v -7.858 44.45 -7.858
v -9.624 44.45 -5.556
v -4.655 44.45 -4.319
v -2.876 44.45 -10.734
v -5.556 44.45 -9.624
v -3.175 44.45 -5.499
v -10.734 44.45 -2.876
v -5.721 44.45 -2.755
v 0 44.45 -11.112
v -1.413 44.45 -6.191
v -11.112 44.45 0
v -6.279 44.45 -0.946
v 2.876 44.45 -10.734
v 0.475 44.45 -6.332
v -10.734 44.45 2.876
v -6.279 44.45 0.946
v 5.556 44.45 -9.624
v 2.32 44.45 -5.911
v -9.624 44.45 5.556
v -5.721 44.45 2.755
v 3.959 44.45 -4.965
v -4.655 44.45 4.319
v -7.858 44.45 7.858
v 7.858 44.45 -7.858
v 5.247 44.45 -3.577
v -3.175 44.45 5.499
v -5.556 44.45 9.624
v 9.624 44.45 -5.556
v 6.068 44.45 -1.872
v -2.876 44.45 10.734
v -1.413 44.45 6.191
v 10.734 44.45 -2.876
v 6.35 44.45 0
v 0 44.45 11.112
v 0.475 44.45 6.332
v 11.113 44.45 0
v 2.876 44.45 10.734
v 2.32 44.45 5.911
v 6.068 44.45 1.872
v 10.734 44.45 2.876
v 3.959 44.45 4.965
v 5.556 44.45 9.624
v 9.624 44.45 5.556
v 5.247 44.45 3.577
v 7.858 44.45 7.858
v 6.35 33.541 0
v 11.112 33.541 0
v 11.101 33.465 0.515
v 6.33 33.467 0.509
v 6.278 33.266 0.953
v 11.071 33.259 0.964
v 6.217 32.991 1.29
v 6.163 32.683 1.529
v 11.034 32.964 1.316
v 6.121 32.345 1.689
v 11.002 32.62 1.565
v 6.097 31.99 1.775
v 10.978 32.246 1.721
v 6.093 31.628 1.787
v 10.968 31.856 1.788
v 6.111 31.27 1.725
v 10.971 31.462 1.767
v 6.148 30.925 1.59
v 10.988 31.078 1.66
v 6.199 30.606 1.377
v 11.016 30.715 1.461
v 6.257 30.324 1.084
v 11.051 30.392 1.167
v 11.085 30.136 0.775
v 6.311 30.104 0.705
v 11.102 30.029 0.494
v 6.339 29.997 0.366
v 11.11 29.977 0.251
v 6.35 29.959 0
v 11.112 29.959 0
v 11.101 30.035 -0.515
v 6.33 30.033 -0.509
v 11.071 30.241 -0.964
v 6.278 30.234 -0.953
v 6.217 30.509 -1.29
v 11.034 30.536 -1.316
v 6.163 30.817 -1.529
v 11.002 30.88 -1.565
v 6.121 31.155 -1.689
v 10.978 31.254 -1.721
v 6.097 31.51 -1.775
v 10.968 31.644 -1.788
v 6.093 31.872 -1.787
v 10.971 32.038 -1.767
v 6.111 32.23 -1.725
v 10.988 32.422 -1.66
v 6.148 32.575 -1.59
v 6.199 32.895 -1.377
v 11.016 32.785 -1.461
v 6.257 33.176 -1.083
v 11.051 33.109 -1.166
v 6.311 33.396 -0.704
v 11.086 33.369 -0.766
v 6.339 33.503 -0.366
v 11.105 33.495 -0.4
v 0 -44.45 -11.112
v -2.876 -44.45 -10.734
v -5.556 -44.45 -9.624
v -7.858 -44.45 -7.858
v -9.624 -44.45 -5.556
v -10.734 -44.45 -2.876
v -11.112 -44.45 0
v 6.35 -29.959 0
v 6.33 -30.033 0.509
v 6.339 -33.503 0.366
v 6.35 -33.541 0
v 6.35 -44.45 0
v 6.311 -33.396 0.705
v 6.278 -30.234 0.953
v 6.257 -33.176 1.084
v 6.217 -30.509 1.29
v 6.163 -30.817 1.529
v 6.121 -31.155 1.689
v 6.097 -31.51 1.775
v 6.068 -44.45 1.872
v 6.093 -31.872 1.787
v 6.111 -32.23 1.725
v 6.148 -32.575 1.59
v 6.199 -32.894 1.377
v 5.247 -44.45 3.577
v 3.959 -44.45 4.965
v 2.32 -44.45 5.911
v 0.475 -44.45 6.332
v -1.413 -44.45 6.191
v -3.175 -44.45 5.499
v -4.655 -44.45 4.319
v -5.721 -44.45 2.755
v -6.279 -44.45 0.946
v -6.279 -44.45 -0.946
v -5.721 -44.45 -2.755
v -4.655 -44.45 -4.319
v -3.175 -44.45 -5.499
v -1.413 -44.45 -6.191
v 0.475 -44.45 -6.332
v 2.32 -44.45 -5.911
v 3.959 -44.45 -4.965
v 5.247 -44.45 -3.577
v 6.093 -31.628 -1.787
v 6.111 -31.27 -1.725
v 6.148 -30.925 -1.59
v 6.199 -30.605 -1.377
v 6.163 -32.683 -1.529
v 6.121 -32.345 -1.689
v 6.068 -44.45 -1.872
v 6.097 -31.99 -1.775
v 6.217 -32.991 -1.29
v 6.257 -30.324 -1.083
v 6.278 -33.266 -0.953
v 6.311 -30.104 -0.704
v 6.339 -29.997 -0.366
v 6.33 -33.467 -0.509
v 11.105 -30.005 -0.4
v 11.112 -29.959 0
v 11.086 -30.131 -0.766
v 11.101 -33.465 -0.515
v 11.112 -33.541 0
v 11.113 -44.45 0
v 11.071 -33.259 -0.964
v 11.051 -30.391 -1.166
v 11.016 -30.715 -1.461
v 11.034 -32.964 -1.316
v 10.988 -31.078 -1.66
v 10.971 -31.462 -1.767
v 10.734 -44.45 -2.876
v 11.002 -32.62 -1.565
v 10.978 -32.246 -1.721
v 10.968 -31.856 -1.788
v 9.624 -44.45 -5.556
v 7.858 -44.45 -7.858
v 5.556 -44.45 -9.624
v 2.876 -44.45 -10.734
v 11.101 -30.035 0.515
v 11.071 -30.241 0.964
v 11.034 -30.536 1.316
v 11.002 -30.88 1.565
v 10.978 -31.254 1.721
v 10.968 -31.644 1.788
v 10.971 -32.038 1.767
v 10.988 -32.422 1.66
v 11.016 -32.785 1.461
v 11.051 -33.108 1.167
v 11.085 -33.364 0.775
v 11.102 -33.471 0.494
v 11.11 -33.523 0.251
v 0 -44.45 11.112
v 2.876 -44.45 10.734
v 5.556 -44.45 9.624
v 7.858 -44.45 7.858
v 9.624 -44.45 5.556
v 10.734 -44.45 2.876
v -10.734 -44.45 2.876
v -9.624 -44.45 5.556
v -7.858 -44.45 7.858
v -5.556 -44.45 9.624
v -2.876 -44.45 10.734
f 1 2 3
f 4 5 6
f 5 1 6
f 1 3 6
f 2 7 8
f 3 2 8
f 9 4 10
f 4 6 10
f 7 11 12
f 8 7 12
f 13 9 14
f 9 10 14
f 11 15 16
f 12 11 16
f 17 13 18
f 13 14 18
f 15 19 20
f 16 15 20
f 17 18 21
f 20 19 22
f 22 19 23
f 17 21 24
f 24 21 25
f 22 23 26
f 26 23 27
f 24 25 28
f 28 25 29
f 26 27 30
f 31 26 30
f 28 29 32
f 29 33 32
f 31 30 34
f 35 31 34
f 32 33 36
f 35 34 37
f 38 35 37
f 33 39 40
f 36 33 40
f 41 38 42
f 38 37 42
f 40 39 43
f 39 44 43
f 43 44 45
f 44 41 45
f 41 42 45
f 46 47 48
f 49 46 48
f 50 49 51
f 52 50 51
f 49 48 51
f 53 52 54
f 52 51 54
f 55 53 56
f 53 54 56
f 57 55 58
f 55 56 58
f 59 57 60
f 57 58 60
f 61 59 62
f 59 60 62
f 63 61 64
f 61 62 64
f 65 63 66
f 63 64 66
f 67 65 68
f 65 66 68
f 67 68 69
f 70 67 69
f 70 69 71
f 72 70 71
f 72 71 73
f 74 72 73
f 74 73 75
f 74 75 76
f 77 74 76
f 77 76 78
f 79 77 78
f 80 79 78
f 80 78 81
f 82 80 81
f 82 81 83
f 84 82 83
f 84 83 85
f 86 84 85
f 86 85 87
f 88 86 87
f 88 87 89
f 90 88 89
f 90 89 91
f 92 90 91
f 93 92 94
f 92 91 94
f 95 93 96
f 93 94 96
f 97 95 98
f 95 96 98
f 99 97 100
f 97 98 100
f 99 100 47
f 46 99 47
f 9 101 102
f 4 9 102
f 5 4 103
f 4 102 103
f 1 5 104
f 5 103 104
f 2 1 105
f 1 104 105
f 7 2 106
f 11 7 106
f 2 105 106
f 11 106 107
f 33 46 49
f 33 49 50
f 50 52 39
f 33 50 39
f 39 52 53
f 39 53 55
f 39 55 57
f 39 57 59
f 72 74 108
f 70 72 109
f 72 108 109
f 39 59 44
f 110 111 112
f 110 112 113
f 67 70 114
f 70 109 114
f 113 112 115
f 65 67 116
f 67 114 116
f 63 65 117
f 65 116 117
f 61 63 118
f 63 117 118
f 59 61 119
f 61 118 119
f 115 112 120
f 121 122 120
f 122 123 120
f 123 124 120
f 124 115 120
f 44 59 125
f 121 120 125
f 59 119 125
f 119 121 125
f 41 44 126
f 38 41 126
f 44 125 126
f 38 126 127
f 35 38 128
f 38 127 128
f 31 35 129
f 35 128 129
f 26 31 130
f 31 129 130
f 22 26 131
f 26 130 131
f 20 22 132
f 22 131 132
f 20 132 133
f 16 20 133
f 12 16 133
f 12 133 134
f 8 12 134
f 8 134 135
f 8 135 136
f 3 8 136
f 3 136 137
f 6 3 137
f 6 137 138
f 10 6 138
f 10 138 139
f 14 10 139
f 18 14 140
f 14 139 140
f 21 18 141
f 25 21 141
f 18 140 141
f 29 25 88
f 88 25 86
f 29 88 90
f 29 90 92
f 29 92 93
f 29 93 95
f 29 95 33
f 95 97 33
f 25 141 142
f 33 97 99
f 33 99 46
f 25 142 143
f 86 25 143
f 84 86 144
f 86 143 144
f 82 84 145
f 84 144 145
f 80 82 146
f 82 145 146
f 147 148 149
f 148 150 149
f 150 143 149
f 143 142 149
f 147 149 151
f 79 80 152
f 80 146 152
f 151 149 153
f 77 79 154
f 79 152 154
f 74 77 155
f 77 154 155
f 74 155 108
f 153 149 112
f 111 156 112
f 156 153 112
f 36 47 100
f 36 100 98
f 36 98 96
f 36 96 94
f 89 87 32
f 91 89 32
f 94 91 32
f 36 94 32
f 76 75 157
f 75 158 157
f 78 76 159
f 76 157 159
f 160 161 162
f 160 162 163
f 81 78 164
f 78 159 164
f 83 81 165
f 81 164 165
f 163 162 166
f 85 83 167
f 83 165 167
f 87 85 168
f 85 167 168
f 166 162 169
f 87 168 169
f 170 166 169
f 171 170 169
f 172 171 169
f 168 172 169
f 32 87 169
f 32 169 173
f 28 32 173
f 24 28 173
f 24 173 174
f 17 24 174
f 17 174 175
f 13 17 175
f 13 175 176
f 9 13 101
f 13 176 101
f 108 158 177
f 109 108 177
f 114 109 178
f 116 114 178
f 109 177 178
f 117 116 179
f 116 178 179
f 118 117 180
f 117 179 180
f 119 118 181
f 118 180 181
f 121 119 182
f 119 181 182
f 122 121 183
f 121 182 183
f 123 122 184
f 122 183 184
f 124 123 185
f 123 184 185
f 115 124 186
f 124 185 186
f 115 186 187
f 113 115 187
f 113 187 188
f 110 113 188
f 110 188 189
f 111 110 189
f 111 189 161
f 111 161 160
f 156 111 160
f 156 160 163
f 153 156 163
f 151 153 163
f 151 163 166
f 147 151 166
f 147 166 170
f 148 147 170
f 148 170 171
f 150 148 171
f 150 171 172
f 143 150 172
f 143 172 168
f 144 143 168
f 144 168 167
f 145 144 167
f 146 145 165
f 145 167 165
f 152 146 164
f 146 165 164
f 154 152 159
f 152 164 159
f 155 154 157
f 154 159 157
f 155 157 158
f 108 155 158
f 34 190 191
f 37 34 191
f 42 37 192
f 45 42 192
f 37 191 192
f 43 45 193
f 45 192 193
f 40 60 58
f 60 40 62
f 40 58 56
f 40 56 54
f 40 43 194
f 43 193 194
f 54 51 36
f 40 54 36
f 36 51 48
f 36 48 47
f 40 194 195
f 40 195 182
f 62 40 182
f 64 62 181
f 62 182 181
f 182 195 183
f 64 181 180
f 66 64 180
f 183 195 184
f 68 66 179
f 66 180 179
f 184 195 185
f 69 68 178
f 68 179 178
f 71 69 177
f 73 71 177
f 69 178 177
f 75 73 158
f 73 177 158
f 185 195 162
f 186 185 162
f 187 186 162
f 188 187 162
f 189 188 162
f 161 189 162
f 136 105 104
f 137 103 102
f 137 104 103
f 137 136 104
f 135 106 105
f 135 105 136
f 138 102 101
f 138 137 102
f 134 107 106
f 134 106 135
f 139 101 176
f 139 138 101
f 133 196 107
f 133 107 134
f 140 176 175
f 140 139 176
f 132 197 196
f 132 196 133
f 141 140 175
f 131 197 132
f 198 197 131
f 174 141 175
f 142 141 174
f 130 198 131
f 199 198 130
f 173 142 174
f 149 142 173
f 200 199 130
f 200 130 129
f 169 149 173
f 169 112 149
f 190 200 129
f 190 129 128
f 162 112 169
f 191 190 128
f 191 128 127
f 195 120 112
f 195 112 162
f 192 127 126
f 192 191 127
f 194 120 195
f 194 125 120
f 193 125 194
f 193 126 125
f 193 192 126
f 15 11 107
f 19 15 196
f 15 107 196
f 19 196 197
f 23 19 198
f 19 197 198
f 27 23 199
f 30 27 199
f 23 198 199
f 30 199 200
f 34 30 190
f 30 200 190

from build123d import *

# Parameters (mm, degrees)
F0_W     = 22.225
F0_H     = 22.225
F1_DEPTH = 44.45
F2_R     = 1.7907
F3_DEPTH = 10.16
F4_R     = 1.7907
F5_DEPTH = 10.16
F7_DEPTH = 88.9
F8_R     = 6.35
F9_DEPTH = 88.9


with BuildPart() as f1:
    # F0 (on Front) → F1 (new body, symmetric)
    with BuildSketch(Plane.XZ):
        Rectangle(F0_W, F0_H)
    extrude(amount=F1_DEPTH, both=True)

    # F2 (on face) → F3 (cut)
    with BuildSketch(Plane.YZ.offset(11.1125)):
        with Locations((31.75, 0)):
            Circle(F2_R)
    extrude(amount=-F3_DEPTH, mode=Mode.SUBTRACT)

    # F4 (on face) → F5 (cut)
    with BuildSketch(Plane.YZ.offset(11.1125)):
        with Locations((-31.75, 0)):
            Circle(F4_R)
    extrude(amount=-F5_DEPTH, mode=Mode.SUBTRACT)

    # F6 (on face) → F7 (cut)
    with BuildSketch(Plane.XZ.offset(44.45)):
        with BuildLine():
            ThreePointArc((-11.1125, -4.55e-08), (-7.857724122, 7.8577240898), (0, 11.1125))
            Line((0, 11.1125), (-9.5319095999, 11.1125))
            Line((-9.5319095999, 11.1125), (-11.1125, 11.1125))
            Line((-11.1125, 11.1125), (-11.1125, -4.55e-08))
        make_face()
        with BuildLine():
            ThreePointArc((0, 11.1125), (7.8577241059, 7.8577241059), (11.1125, 0))
            Line((11.1125, 0), (11.1125, 11.1125))
            Line((11.1125, 11.1125), (0, 11.1125))
        make_face()
        with BuildLine():
            Line((11.1125, -11.1125), (11.1125, 0))
            ThreePointArc((11.1125, 0), (7.8577241059, -7.8577241059), (0, -11.1125))
            Line((0, -11.1125), (11.1125, -11.1125))
        make_face()
        with BuildLine():
            Line((-11.1125, -11.1125), (0, -11.1125))
            ThreePointArc((0, -11.1125), (-7.8577240898, -7.857724122), (-11.1125, -4.55e-08))
            Line((-11.1125, -4.55e-08), (-11.1125, -11.1125))
        make_face()
    extrude(amount=-F7_DEPTH, mode=Mode.SUBTRACT)

    # F8 (on face) → F9 (cut)
    with BuildSketch(Plane.XZ.offset(44.45)):
        Circle(F8_R)
    extrude(amount=-F9_DEPTH, mode=Mode.SUBTRACT)


solid = f1.part
